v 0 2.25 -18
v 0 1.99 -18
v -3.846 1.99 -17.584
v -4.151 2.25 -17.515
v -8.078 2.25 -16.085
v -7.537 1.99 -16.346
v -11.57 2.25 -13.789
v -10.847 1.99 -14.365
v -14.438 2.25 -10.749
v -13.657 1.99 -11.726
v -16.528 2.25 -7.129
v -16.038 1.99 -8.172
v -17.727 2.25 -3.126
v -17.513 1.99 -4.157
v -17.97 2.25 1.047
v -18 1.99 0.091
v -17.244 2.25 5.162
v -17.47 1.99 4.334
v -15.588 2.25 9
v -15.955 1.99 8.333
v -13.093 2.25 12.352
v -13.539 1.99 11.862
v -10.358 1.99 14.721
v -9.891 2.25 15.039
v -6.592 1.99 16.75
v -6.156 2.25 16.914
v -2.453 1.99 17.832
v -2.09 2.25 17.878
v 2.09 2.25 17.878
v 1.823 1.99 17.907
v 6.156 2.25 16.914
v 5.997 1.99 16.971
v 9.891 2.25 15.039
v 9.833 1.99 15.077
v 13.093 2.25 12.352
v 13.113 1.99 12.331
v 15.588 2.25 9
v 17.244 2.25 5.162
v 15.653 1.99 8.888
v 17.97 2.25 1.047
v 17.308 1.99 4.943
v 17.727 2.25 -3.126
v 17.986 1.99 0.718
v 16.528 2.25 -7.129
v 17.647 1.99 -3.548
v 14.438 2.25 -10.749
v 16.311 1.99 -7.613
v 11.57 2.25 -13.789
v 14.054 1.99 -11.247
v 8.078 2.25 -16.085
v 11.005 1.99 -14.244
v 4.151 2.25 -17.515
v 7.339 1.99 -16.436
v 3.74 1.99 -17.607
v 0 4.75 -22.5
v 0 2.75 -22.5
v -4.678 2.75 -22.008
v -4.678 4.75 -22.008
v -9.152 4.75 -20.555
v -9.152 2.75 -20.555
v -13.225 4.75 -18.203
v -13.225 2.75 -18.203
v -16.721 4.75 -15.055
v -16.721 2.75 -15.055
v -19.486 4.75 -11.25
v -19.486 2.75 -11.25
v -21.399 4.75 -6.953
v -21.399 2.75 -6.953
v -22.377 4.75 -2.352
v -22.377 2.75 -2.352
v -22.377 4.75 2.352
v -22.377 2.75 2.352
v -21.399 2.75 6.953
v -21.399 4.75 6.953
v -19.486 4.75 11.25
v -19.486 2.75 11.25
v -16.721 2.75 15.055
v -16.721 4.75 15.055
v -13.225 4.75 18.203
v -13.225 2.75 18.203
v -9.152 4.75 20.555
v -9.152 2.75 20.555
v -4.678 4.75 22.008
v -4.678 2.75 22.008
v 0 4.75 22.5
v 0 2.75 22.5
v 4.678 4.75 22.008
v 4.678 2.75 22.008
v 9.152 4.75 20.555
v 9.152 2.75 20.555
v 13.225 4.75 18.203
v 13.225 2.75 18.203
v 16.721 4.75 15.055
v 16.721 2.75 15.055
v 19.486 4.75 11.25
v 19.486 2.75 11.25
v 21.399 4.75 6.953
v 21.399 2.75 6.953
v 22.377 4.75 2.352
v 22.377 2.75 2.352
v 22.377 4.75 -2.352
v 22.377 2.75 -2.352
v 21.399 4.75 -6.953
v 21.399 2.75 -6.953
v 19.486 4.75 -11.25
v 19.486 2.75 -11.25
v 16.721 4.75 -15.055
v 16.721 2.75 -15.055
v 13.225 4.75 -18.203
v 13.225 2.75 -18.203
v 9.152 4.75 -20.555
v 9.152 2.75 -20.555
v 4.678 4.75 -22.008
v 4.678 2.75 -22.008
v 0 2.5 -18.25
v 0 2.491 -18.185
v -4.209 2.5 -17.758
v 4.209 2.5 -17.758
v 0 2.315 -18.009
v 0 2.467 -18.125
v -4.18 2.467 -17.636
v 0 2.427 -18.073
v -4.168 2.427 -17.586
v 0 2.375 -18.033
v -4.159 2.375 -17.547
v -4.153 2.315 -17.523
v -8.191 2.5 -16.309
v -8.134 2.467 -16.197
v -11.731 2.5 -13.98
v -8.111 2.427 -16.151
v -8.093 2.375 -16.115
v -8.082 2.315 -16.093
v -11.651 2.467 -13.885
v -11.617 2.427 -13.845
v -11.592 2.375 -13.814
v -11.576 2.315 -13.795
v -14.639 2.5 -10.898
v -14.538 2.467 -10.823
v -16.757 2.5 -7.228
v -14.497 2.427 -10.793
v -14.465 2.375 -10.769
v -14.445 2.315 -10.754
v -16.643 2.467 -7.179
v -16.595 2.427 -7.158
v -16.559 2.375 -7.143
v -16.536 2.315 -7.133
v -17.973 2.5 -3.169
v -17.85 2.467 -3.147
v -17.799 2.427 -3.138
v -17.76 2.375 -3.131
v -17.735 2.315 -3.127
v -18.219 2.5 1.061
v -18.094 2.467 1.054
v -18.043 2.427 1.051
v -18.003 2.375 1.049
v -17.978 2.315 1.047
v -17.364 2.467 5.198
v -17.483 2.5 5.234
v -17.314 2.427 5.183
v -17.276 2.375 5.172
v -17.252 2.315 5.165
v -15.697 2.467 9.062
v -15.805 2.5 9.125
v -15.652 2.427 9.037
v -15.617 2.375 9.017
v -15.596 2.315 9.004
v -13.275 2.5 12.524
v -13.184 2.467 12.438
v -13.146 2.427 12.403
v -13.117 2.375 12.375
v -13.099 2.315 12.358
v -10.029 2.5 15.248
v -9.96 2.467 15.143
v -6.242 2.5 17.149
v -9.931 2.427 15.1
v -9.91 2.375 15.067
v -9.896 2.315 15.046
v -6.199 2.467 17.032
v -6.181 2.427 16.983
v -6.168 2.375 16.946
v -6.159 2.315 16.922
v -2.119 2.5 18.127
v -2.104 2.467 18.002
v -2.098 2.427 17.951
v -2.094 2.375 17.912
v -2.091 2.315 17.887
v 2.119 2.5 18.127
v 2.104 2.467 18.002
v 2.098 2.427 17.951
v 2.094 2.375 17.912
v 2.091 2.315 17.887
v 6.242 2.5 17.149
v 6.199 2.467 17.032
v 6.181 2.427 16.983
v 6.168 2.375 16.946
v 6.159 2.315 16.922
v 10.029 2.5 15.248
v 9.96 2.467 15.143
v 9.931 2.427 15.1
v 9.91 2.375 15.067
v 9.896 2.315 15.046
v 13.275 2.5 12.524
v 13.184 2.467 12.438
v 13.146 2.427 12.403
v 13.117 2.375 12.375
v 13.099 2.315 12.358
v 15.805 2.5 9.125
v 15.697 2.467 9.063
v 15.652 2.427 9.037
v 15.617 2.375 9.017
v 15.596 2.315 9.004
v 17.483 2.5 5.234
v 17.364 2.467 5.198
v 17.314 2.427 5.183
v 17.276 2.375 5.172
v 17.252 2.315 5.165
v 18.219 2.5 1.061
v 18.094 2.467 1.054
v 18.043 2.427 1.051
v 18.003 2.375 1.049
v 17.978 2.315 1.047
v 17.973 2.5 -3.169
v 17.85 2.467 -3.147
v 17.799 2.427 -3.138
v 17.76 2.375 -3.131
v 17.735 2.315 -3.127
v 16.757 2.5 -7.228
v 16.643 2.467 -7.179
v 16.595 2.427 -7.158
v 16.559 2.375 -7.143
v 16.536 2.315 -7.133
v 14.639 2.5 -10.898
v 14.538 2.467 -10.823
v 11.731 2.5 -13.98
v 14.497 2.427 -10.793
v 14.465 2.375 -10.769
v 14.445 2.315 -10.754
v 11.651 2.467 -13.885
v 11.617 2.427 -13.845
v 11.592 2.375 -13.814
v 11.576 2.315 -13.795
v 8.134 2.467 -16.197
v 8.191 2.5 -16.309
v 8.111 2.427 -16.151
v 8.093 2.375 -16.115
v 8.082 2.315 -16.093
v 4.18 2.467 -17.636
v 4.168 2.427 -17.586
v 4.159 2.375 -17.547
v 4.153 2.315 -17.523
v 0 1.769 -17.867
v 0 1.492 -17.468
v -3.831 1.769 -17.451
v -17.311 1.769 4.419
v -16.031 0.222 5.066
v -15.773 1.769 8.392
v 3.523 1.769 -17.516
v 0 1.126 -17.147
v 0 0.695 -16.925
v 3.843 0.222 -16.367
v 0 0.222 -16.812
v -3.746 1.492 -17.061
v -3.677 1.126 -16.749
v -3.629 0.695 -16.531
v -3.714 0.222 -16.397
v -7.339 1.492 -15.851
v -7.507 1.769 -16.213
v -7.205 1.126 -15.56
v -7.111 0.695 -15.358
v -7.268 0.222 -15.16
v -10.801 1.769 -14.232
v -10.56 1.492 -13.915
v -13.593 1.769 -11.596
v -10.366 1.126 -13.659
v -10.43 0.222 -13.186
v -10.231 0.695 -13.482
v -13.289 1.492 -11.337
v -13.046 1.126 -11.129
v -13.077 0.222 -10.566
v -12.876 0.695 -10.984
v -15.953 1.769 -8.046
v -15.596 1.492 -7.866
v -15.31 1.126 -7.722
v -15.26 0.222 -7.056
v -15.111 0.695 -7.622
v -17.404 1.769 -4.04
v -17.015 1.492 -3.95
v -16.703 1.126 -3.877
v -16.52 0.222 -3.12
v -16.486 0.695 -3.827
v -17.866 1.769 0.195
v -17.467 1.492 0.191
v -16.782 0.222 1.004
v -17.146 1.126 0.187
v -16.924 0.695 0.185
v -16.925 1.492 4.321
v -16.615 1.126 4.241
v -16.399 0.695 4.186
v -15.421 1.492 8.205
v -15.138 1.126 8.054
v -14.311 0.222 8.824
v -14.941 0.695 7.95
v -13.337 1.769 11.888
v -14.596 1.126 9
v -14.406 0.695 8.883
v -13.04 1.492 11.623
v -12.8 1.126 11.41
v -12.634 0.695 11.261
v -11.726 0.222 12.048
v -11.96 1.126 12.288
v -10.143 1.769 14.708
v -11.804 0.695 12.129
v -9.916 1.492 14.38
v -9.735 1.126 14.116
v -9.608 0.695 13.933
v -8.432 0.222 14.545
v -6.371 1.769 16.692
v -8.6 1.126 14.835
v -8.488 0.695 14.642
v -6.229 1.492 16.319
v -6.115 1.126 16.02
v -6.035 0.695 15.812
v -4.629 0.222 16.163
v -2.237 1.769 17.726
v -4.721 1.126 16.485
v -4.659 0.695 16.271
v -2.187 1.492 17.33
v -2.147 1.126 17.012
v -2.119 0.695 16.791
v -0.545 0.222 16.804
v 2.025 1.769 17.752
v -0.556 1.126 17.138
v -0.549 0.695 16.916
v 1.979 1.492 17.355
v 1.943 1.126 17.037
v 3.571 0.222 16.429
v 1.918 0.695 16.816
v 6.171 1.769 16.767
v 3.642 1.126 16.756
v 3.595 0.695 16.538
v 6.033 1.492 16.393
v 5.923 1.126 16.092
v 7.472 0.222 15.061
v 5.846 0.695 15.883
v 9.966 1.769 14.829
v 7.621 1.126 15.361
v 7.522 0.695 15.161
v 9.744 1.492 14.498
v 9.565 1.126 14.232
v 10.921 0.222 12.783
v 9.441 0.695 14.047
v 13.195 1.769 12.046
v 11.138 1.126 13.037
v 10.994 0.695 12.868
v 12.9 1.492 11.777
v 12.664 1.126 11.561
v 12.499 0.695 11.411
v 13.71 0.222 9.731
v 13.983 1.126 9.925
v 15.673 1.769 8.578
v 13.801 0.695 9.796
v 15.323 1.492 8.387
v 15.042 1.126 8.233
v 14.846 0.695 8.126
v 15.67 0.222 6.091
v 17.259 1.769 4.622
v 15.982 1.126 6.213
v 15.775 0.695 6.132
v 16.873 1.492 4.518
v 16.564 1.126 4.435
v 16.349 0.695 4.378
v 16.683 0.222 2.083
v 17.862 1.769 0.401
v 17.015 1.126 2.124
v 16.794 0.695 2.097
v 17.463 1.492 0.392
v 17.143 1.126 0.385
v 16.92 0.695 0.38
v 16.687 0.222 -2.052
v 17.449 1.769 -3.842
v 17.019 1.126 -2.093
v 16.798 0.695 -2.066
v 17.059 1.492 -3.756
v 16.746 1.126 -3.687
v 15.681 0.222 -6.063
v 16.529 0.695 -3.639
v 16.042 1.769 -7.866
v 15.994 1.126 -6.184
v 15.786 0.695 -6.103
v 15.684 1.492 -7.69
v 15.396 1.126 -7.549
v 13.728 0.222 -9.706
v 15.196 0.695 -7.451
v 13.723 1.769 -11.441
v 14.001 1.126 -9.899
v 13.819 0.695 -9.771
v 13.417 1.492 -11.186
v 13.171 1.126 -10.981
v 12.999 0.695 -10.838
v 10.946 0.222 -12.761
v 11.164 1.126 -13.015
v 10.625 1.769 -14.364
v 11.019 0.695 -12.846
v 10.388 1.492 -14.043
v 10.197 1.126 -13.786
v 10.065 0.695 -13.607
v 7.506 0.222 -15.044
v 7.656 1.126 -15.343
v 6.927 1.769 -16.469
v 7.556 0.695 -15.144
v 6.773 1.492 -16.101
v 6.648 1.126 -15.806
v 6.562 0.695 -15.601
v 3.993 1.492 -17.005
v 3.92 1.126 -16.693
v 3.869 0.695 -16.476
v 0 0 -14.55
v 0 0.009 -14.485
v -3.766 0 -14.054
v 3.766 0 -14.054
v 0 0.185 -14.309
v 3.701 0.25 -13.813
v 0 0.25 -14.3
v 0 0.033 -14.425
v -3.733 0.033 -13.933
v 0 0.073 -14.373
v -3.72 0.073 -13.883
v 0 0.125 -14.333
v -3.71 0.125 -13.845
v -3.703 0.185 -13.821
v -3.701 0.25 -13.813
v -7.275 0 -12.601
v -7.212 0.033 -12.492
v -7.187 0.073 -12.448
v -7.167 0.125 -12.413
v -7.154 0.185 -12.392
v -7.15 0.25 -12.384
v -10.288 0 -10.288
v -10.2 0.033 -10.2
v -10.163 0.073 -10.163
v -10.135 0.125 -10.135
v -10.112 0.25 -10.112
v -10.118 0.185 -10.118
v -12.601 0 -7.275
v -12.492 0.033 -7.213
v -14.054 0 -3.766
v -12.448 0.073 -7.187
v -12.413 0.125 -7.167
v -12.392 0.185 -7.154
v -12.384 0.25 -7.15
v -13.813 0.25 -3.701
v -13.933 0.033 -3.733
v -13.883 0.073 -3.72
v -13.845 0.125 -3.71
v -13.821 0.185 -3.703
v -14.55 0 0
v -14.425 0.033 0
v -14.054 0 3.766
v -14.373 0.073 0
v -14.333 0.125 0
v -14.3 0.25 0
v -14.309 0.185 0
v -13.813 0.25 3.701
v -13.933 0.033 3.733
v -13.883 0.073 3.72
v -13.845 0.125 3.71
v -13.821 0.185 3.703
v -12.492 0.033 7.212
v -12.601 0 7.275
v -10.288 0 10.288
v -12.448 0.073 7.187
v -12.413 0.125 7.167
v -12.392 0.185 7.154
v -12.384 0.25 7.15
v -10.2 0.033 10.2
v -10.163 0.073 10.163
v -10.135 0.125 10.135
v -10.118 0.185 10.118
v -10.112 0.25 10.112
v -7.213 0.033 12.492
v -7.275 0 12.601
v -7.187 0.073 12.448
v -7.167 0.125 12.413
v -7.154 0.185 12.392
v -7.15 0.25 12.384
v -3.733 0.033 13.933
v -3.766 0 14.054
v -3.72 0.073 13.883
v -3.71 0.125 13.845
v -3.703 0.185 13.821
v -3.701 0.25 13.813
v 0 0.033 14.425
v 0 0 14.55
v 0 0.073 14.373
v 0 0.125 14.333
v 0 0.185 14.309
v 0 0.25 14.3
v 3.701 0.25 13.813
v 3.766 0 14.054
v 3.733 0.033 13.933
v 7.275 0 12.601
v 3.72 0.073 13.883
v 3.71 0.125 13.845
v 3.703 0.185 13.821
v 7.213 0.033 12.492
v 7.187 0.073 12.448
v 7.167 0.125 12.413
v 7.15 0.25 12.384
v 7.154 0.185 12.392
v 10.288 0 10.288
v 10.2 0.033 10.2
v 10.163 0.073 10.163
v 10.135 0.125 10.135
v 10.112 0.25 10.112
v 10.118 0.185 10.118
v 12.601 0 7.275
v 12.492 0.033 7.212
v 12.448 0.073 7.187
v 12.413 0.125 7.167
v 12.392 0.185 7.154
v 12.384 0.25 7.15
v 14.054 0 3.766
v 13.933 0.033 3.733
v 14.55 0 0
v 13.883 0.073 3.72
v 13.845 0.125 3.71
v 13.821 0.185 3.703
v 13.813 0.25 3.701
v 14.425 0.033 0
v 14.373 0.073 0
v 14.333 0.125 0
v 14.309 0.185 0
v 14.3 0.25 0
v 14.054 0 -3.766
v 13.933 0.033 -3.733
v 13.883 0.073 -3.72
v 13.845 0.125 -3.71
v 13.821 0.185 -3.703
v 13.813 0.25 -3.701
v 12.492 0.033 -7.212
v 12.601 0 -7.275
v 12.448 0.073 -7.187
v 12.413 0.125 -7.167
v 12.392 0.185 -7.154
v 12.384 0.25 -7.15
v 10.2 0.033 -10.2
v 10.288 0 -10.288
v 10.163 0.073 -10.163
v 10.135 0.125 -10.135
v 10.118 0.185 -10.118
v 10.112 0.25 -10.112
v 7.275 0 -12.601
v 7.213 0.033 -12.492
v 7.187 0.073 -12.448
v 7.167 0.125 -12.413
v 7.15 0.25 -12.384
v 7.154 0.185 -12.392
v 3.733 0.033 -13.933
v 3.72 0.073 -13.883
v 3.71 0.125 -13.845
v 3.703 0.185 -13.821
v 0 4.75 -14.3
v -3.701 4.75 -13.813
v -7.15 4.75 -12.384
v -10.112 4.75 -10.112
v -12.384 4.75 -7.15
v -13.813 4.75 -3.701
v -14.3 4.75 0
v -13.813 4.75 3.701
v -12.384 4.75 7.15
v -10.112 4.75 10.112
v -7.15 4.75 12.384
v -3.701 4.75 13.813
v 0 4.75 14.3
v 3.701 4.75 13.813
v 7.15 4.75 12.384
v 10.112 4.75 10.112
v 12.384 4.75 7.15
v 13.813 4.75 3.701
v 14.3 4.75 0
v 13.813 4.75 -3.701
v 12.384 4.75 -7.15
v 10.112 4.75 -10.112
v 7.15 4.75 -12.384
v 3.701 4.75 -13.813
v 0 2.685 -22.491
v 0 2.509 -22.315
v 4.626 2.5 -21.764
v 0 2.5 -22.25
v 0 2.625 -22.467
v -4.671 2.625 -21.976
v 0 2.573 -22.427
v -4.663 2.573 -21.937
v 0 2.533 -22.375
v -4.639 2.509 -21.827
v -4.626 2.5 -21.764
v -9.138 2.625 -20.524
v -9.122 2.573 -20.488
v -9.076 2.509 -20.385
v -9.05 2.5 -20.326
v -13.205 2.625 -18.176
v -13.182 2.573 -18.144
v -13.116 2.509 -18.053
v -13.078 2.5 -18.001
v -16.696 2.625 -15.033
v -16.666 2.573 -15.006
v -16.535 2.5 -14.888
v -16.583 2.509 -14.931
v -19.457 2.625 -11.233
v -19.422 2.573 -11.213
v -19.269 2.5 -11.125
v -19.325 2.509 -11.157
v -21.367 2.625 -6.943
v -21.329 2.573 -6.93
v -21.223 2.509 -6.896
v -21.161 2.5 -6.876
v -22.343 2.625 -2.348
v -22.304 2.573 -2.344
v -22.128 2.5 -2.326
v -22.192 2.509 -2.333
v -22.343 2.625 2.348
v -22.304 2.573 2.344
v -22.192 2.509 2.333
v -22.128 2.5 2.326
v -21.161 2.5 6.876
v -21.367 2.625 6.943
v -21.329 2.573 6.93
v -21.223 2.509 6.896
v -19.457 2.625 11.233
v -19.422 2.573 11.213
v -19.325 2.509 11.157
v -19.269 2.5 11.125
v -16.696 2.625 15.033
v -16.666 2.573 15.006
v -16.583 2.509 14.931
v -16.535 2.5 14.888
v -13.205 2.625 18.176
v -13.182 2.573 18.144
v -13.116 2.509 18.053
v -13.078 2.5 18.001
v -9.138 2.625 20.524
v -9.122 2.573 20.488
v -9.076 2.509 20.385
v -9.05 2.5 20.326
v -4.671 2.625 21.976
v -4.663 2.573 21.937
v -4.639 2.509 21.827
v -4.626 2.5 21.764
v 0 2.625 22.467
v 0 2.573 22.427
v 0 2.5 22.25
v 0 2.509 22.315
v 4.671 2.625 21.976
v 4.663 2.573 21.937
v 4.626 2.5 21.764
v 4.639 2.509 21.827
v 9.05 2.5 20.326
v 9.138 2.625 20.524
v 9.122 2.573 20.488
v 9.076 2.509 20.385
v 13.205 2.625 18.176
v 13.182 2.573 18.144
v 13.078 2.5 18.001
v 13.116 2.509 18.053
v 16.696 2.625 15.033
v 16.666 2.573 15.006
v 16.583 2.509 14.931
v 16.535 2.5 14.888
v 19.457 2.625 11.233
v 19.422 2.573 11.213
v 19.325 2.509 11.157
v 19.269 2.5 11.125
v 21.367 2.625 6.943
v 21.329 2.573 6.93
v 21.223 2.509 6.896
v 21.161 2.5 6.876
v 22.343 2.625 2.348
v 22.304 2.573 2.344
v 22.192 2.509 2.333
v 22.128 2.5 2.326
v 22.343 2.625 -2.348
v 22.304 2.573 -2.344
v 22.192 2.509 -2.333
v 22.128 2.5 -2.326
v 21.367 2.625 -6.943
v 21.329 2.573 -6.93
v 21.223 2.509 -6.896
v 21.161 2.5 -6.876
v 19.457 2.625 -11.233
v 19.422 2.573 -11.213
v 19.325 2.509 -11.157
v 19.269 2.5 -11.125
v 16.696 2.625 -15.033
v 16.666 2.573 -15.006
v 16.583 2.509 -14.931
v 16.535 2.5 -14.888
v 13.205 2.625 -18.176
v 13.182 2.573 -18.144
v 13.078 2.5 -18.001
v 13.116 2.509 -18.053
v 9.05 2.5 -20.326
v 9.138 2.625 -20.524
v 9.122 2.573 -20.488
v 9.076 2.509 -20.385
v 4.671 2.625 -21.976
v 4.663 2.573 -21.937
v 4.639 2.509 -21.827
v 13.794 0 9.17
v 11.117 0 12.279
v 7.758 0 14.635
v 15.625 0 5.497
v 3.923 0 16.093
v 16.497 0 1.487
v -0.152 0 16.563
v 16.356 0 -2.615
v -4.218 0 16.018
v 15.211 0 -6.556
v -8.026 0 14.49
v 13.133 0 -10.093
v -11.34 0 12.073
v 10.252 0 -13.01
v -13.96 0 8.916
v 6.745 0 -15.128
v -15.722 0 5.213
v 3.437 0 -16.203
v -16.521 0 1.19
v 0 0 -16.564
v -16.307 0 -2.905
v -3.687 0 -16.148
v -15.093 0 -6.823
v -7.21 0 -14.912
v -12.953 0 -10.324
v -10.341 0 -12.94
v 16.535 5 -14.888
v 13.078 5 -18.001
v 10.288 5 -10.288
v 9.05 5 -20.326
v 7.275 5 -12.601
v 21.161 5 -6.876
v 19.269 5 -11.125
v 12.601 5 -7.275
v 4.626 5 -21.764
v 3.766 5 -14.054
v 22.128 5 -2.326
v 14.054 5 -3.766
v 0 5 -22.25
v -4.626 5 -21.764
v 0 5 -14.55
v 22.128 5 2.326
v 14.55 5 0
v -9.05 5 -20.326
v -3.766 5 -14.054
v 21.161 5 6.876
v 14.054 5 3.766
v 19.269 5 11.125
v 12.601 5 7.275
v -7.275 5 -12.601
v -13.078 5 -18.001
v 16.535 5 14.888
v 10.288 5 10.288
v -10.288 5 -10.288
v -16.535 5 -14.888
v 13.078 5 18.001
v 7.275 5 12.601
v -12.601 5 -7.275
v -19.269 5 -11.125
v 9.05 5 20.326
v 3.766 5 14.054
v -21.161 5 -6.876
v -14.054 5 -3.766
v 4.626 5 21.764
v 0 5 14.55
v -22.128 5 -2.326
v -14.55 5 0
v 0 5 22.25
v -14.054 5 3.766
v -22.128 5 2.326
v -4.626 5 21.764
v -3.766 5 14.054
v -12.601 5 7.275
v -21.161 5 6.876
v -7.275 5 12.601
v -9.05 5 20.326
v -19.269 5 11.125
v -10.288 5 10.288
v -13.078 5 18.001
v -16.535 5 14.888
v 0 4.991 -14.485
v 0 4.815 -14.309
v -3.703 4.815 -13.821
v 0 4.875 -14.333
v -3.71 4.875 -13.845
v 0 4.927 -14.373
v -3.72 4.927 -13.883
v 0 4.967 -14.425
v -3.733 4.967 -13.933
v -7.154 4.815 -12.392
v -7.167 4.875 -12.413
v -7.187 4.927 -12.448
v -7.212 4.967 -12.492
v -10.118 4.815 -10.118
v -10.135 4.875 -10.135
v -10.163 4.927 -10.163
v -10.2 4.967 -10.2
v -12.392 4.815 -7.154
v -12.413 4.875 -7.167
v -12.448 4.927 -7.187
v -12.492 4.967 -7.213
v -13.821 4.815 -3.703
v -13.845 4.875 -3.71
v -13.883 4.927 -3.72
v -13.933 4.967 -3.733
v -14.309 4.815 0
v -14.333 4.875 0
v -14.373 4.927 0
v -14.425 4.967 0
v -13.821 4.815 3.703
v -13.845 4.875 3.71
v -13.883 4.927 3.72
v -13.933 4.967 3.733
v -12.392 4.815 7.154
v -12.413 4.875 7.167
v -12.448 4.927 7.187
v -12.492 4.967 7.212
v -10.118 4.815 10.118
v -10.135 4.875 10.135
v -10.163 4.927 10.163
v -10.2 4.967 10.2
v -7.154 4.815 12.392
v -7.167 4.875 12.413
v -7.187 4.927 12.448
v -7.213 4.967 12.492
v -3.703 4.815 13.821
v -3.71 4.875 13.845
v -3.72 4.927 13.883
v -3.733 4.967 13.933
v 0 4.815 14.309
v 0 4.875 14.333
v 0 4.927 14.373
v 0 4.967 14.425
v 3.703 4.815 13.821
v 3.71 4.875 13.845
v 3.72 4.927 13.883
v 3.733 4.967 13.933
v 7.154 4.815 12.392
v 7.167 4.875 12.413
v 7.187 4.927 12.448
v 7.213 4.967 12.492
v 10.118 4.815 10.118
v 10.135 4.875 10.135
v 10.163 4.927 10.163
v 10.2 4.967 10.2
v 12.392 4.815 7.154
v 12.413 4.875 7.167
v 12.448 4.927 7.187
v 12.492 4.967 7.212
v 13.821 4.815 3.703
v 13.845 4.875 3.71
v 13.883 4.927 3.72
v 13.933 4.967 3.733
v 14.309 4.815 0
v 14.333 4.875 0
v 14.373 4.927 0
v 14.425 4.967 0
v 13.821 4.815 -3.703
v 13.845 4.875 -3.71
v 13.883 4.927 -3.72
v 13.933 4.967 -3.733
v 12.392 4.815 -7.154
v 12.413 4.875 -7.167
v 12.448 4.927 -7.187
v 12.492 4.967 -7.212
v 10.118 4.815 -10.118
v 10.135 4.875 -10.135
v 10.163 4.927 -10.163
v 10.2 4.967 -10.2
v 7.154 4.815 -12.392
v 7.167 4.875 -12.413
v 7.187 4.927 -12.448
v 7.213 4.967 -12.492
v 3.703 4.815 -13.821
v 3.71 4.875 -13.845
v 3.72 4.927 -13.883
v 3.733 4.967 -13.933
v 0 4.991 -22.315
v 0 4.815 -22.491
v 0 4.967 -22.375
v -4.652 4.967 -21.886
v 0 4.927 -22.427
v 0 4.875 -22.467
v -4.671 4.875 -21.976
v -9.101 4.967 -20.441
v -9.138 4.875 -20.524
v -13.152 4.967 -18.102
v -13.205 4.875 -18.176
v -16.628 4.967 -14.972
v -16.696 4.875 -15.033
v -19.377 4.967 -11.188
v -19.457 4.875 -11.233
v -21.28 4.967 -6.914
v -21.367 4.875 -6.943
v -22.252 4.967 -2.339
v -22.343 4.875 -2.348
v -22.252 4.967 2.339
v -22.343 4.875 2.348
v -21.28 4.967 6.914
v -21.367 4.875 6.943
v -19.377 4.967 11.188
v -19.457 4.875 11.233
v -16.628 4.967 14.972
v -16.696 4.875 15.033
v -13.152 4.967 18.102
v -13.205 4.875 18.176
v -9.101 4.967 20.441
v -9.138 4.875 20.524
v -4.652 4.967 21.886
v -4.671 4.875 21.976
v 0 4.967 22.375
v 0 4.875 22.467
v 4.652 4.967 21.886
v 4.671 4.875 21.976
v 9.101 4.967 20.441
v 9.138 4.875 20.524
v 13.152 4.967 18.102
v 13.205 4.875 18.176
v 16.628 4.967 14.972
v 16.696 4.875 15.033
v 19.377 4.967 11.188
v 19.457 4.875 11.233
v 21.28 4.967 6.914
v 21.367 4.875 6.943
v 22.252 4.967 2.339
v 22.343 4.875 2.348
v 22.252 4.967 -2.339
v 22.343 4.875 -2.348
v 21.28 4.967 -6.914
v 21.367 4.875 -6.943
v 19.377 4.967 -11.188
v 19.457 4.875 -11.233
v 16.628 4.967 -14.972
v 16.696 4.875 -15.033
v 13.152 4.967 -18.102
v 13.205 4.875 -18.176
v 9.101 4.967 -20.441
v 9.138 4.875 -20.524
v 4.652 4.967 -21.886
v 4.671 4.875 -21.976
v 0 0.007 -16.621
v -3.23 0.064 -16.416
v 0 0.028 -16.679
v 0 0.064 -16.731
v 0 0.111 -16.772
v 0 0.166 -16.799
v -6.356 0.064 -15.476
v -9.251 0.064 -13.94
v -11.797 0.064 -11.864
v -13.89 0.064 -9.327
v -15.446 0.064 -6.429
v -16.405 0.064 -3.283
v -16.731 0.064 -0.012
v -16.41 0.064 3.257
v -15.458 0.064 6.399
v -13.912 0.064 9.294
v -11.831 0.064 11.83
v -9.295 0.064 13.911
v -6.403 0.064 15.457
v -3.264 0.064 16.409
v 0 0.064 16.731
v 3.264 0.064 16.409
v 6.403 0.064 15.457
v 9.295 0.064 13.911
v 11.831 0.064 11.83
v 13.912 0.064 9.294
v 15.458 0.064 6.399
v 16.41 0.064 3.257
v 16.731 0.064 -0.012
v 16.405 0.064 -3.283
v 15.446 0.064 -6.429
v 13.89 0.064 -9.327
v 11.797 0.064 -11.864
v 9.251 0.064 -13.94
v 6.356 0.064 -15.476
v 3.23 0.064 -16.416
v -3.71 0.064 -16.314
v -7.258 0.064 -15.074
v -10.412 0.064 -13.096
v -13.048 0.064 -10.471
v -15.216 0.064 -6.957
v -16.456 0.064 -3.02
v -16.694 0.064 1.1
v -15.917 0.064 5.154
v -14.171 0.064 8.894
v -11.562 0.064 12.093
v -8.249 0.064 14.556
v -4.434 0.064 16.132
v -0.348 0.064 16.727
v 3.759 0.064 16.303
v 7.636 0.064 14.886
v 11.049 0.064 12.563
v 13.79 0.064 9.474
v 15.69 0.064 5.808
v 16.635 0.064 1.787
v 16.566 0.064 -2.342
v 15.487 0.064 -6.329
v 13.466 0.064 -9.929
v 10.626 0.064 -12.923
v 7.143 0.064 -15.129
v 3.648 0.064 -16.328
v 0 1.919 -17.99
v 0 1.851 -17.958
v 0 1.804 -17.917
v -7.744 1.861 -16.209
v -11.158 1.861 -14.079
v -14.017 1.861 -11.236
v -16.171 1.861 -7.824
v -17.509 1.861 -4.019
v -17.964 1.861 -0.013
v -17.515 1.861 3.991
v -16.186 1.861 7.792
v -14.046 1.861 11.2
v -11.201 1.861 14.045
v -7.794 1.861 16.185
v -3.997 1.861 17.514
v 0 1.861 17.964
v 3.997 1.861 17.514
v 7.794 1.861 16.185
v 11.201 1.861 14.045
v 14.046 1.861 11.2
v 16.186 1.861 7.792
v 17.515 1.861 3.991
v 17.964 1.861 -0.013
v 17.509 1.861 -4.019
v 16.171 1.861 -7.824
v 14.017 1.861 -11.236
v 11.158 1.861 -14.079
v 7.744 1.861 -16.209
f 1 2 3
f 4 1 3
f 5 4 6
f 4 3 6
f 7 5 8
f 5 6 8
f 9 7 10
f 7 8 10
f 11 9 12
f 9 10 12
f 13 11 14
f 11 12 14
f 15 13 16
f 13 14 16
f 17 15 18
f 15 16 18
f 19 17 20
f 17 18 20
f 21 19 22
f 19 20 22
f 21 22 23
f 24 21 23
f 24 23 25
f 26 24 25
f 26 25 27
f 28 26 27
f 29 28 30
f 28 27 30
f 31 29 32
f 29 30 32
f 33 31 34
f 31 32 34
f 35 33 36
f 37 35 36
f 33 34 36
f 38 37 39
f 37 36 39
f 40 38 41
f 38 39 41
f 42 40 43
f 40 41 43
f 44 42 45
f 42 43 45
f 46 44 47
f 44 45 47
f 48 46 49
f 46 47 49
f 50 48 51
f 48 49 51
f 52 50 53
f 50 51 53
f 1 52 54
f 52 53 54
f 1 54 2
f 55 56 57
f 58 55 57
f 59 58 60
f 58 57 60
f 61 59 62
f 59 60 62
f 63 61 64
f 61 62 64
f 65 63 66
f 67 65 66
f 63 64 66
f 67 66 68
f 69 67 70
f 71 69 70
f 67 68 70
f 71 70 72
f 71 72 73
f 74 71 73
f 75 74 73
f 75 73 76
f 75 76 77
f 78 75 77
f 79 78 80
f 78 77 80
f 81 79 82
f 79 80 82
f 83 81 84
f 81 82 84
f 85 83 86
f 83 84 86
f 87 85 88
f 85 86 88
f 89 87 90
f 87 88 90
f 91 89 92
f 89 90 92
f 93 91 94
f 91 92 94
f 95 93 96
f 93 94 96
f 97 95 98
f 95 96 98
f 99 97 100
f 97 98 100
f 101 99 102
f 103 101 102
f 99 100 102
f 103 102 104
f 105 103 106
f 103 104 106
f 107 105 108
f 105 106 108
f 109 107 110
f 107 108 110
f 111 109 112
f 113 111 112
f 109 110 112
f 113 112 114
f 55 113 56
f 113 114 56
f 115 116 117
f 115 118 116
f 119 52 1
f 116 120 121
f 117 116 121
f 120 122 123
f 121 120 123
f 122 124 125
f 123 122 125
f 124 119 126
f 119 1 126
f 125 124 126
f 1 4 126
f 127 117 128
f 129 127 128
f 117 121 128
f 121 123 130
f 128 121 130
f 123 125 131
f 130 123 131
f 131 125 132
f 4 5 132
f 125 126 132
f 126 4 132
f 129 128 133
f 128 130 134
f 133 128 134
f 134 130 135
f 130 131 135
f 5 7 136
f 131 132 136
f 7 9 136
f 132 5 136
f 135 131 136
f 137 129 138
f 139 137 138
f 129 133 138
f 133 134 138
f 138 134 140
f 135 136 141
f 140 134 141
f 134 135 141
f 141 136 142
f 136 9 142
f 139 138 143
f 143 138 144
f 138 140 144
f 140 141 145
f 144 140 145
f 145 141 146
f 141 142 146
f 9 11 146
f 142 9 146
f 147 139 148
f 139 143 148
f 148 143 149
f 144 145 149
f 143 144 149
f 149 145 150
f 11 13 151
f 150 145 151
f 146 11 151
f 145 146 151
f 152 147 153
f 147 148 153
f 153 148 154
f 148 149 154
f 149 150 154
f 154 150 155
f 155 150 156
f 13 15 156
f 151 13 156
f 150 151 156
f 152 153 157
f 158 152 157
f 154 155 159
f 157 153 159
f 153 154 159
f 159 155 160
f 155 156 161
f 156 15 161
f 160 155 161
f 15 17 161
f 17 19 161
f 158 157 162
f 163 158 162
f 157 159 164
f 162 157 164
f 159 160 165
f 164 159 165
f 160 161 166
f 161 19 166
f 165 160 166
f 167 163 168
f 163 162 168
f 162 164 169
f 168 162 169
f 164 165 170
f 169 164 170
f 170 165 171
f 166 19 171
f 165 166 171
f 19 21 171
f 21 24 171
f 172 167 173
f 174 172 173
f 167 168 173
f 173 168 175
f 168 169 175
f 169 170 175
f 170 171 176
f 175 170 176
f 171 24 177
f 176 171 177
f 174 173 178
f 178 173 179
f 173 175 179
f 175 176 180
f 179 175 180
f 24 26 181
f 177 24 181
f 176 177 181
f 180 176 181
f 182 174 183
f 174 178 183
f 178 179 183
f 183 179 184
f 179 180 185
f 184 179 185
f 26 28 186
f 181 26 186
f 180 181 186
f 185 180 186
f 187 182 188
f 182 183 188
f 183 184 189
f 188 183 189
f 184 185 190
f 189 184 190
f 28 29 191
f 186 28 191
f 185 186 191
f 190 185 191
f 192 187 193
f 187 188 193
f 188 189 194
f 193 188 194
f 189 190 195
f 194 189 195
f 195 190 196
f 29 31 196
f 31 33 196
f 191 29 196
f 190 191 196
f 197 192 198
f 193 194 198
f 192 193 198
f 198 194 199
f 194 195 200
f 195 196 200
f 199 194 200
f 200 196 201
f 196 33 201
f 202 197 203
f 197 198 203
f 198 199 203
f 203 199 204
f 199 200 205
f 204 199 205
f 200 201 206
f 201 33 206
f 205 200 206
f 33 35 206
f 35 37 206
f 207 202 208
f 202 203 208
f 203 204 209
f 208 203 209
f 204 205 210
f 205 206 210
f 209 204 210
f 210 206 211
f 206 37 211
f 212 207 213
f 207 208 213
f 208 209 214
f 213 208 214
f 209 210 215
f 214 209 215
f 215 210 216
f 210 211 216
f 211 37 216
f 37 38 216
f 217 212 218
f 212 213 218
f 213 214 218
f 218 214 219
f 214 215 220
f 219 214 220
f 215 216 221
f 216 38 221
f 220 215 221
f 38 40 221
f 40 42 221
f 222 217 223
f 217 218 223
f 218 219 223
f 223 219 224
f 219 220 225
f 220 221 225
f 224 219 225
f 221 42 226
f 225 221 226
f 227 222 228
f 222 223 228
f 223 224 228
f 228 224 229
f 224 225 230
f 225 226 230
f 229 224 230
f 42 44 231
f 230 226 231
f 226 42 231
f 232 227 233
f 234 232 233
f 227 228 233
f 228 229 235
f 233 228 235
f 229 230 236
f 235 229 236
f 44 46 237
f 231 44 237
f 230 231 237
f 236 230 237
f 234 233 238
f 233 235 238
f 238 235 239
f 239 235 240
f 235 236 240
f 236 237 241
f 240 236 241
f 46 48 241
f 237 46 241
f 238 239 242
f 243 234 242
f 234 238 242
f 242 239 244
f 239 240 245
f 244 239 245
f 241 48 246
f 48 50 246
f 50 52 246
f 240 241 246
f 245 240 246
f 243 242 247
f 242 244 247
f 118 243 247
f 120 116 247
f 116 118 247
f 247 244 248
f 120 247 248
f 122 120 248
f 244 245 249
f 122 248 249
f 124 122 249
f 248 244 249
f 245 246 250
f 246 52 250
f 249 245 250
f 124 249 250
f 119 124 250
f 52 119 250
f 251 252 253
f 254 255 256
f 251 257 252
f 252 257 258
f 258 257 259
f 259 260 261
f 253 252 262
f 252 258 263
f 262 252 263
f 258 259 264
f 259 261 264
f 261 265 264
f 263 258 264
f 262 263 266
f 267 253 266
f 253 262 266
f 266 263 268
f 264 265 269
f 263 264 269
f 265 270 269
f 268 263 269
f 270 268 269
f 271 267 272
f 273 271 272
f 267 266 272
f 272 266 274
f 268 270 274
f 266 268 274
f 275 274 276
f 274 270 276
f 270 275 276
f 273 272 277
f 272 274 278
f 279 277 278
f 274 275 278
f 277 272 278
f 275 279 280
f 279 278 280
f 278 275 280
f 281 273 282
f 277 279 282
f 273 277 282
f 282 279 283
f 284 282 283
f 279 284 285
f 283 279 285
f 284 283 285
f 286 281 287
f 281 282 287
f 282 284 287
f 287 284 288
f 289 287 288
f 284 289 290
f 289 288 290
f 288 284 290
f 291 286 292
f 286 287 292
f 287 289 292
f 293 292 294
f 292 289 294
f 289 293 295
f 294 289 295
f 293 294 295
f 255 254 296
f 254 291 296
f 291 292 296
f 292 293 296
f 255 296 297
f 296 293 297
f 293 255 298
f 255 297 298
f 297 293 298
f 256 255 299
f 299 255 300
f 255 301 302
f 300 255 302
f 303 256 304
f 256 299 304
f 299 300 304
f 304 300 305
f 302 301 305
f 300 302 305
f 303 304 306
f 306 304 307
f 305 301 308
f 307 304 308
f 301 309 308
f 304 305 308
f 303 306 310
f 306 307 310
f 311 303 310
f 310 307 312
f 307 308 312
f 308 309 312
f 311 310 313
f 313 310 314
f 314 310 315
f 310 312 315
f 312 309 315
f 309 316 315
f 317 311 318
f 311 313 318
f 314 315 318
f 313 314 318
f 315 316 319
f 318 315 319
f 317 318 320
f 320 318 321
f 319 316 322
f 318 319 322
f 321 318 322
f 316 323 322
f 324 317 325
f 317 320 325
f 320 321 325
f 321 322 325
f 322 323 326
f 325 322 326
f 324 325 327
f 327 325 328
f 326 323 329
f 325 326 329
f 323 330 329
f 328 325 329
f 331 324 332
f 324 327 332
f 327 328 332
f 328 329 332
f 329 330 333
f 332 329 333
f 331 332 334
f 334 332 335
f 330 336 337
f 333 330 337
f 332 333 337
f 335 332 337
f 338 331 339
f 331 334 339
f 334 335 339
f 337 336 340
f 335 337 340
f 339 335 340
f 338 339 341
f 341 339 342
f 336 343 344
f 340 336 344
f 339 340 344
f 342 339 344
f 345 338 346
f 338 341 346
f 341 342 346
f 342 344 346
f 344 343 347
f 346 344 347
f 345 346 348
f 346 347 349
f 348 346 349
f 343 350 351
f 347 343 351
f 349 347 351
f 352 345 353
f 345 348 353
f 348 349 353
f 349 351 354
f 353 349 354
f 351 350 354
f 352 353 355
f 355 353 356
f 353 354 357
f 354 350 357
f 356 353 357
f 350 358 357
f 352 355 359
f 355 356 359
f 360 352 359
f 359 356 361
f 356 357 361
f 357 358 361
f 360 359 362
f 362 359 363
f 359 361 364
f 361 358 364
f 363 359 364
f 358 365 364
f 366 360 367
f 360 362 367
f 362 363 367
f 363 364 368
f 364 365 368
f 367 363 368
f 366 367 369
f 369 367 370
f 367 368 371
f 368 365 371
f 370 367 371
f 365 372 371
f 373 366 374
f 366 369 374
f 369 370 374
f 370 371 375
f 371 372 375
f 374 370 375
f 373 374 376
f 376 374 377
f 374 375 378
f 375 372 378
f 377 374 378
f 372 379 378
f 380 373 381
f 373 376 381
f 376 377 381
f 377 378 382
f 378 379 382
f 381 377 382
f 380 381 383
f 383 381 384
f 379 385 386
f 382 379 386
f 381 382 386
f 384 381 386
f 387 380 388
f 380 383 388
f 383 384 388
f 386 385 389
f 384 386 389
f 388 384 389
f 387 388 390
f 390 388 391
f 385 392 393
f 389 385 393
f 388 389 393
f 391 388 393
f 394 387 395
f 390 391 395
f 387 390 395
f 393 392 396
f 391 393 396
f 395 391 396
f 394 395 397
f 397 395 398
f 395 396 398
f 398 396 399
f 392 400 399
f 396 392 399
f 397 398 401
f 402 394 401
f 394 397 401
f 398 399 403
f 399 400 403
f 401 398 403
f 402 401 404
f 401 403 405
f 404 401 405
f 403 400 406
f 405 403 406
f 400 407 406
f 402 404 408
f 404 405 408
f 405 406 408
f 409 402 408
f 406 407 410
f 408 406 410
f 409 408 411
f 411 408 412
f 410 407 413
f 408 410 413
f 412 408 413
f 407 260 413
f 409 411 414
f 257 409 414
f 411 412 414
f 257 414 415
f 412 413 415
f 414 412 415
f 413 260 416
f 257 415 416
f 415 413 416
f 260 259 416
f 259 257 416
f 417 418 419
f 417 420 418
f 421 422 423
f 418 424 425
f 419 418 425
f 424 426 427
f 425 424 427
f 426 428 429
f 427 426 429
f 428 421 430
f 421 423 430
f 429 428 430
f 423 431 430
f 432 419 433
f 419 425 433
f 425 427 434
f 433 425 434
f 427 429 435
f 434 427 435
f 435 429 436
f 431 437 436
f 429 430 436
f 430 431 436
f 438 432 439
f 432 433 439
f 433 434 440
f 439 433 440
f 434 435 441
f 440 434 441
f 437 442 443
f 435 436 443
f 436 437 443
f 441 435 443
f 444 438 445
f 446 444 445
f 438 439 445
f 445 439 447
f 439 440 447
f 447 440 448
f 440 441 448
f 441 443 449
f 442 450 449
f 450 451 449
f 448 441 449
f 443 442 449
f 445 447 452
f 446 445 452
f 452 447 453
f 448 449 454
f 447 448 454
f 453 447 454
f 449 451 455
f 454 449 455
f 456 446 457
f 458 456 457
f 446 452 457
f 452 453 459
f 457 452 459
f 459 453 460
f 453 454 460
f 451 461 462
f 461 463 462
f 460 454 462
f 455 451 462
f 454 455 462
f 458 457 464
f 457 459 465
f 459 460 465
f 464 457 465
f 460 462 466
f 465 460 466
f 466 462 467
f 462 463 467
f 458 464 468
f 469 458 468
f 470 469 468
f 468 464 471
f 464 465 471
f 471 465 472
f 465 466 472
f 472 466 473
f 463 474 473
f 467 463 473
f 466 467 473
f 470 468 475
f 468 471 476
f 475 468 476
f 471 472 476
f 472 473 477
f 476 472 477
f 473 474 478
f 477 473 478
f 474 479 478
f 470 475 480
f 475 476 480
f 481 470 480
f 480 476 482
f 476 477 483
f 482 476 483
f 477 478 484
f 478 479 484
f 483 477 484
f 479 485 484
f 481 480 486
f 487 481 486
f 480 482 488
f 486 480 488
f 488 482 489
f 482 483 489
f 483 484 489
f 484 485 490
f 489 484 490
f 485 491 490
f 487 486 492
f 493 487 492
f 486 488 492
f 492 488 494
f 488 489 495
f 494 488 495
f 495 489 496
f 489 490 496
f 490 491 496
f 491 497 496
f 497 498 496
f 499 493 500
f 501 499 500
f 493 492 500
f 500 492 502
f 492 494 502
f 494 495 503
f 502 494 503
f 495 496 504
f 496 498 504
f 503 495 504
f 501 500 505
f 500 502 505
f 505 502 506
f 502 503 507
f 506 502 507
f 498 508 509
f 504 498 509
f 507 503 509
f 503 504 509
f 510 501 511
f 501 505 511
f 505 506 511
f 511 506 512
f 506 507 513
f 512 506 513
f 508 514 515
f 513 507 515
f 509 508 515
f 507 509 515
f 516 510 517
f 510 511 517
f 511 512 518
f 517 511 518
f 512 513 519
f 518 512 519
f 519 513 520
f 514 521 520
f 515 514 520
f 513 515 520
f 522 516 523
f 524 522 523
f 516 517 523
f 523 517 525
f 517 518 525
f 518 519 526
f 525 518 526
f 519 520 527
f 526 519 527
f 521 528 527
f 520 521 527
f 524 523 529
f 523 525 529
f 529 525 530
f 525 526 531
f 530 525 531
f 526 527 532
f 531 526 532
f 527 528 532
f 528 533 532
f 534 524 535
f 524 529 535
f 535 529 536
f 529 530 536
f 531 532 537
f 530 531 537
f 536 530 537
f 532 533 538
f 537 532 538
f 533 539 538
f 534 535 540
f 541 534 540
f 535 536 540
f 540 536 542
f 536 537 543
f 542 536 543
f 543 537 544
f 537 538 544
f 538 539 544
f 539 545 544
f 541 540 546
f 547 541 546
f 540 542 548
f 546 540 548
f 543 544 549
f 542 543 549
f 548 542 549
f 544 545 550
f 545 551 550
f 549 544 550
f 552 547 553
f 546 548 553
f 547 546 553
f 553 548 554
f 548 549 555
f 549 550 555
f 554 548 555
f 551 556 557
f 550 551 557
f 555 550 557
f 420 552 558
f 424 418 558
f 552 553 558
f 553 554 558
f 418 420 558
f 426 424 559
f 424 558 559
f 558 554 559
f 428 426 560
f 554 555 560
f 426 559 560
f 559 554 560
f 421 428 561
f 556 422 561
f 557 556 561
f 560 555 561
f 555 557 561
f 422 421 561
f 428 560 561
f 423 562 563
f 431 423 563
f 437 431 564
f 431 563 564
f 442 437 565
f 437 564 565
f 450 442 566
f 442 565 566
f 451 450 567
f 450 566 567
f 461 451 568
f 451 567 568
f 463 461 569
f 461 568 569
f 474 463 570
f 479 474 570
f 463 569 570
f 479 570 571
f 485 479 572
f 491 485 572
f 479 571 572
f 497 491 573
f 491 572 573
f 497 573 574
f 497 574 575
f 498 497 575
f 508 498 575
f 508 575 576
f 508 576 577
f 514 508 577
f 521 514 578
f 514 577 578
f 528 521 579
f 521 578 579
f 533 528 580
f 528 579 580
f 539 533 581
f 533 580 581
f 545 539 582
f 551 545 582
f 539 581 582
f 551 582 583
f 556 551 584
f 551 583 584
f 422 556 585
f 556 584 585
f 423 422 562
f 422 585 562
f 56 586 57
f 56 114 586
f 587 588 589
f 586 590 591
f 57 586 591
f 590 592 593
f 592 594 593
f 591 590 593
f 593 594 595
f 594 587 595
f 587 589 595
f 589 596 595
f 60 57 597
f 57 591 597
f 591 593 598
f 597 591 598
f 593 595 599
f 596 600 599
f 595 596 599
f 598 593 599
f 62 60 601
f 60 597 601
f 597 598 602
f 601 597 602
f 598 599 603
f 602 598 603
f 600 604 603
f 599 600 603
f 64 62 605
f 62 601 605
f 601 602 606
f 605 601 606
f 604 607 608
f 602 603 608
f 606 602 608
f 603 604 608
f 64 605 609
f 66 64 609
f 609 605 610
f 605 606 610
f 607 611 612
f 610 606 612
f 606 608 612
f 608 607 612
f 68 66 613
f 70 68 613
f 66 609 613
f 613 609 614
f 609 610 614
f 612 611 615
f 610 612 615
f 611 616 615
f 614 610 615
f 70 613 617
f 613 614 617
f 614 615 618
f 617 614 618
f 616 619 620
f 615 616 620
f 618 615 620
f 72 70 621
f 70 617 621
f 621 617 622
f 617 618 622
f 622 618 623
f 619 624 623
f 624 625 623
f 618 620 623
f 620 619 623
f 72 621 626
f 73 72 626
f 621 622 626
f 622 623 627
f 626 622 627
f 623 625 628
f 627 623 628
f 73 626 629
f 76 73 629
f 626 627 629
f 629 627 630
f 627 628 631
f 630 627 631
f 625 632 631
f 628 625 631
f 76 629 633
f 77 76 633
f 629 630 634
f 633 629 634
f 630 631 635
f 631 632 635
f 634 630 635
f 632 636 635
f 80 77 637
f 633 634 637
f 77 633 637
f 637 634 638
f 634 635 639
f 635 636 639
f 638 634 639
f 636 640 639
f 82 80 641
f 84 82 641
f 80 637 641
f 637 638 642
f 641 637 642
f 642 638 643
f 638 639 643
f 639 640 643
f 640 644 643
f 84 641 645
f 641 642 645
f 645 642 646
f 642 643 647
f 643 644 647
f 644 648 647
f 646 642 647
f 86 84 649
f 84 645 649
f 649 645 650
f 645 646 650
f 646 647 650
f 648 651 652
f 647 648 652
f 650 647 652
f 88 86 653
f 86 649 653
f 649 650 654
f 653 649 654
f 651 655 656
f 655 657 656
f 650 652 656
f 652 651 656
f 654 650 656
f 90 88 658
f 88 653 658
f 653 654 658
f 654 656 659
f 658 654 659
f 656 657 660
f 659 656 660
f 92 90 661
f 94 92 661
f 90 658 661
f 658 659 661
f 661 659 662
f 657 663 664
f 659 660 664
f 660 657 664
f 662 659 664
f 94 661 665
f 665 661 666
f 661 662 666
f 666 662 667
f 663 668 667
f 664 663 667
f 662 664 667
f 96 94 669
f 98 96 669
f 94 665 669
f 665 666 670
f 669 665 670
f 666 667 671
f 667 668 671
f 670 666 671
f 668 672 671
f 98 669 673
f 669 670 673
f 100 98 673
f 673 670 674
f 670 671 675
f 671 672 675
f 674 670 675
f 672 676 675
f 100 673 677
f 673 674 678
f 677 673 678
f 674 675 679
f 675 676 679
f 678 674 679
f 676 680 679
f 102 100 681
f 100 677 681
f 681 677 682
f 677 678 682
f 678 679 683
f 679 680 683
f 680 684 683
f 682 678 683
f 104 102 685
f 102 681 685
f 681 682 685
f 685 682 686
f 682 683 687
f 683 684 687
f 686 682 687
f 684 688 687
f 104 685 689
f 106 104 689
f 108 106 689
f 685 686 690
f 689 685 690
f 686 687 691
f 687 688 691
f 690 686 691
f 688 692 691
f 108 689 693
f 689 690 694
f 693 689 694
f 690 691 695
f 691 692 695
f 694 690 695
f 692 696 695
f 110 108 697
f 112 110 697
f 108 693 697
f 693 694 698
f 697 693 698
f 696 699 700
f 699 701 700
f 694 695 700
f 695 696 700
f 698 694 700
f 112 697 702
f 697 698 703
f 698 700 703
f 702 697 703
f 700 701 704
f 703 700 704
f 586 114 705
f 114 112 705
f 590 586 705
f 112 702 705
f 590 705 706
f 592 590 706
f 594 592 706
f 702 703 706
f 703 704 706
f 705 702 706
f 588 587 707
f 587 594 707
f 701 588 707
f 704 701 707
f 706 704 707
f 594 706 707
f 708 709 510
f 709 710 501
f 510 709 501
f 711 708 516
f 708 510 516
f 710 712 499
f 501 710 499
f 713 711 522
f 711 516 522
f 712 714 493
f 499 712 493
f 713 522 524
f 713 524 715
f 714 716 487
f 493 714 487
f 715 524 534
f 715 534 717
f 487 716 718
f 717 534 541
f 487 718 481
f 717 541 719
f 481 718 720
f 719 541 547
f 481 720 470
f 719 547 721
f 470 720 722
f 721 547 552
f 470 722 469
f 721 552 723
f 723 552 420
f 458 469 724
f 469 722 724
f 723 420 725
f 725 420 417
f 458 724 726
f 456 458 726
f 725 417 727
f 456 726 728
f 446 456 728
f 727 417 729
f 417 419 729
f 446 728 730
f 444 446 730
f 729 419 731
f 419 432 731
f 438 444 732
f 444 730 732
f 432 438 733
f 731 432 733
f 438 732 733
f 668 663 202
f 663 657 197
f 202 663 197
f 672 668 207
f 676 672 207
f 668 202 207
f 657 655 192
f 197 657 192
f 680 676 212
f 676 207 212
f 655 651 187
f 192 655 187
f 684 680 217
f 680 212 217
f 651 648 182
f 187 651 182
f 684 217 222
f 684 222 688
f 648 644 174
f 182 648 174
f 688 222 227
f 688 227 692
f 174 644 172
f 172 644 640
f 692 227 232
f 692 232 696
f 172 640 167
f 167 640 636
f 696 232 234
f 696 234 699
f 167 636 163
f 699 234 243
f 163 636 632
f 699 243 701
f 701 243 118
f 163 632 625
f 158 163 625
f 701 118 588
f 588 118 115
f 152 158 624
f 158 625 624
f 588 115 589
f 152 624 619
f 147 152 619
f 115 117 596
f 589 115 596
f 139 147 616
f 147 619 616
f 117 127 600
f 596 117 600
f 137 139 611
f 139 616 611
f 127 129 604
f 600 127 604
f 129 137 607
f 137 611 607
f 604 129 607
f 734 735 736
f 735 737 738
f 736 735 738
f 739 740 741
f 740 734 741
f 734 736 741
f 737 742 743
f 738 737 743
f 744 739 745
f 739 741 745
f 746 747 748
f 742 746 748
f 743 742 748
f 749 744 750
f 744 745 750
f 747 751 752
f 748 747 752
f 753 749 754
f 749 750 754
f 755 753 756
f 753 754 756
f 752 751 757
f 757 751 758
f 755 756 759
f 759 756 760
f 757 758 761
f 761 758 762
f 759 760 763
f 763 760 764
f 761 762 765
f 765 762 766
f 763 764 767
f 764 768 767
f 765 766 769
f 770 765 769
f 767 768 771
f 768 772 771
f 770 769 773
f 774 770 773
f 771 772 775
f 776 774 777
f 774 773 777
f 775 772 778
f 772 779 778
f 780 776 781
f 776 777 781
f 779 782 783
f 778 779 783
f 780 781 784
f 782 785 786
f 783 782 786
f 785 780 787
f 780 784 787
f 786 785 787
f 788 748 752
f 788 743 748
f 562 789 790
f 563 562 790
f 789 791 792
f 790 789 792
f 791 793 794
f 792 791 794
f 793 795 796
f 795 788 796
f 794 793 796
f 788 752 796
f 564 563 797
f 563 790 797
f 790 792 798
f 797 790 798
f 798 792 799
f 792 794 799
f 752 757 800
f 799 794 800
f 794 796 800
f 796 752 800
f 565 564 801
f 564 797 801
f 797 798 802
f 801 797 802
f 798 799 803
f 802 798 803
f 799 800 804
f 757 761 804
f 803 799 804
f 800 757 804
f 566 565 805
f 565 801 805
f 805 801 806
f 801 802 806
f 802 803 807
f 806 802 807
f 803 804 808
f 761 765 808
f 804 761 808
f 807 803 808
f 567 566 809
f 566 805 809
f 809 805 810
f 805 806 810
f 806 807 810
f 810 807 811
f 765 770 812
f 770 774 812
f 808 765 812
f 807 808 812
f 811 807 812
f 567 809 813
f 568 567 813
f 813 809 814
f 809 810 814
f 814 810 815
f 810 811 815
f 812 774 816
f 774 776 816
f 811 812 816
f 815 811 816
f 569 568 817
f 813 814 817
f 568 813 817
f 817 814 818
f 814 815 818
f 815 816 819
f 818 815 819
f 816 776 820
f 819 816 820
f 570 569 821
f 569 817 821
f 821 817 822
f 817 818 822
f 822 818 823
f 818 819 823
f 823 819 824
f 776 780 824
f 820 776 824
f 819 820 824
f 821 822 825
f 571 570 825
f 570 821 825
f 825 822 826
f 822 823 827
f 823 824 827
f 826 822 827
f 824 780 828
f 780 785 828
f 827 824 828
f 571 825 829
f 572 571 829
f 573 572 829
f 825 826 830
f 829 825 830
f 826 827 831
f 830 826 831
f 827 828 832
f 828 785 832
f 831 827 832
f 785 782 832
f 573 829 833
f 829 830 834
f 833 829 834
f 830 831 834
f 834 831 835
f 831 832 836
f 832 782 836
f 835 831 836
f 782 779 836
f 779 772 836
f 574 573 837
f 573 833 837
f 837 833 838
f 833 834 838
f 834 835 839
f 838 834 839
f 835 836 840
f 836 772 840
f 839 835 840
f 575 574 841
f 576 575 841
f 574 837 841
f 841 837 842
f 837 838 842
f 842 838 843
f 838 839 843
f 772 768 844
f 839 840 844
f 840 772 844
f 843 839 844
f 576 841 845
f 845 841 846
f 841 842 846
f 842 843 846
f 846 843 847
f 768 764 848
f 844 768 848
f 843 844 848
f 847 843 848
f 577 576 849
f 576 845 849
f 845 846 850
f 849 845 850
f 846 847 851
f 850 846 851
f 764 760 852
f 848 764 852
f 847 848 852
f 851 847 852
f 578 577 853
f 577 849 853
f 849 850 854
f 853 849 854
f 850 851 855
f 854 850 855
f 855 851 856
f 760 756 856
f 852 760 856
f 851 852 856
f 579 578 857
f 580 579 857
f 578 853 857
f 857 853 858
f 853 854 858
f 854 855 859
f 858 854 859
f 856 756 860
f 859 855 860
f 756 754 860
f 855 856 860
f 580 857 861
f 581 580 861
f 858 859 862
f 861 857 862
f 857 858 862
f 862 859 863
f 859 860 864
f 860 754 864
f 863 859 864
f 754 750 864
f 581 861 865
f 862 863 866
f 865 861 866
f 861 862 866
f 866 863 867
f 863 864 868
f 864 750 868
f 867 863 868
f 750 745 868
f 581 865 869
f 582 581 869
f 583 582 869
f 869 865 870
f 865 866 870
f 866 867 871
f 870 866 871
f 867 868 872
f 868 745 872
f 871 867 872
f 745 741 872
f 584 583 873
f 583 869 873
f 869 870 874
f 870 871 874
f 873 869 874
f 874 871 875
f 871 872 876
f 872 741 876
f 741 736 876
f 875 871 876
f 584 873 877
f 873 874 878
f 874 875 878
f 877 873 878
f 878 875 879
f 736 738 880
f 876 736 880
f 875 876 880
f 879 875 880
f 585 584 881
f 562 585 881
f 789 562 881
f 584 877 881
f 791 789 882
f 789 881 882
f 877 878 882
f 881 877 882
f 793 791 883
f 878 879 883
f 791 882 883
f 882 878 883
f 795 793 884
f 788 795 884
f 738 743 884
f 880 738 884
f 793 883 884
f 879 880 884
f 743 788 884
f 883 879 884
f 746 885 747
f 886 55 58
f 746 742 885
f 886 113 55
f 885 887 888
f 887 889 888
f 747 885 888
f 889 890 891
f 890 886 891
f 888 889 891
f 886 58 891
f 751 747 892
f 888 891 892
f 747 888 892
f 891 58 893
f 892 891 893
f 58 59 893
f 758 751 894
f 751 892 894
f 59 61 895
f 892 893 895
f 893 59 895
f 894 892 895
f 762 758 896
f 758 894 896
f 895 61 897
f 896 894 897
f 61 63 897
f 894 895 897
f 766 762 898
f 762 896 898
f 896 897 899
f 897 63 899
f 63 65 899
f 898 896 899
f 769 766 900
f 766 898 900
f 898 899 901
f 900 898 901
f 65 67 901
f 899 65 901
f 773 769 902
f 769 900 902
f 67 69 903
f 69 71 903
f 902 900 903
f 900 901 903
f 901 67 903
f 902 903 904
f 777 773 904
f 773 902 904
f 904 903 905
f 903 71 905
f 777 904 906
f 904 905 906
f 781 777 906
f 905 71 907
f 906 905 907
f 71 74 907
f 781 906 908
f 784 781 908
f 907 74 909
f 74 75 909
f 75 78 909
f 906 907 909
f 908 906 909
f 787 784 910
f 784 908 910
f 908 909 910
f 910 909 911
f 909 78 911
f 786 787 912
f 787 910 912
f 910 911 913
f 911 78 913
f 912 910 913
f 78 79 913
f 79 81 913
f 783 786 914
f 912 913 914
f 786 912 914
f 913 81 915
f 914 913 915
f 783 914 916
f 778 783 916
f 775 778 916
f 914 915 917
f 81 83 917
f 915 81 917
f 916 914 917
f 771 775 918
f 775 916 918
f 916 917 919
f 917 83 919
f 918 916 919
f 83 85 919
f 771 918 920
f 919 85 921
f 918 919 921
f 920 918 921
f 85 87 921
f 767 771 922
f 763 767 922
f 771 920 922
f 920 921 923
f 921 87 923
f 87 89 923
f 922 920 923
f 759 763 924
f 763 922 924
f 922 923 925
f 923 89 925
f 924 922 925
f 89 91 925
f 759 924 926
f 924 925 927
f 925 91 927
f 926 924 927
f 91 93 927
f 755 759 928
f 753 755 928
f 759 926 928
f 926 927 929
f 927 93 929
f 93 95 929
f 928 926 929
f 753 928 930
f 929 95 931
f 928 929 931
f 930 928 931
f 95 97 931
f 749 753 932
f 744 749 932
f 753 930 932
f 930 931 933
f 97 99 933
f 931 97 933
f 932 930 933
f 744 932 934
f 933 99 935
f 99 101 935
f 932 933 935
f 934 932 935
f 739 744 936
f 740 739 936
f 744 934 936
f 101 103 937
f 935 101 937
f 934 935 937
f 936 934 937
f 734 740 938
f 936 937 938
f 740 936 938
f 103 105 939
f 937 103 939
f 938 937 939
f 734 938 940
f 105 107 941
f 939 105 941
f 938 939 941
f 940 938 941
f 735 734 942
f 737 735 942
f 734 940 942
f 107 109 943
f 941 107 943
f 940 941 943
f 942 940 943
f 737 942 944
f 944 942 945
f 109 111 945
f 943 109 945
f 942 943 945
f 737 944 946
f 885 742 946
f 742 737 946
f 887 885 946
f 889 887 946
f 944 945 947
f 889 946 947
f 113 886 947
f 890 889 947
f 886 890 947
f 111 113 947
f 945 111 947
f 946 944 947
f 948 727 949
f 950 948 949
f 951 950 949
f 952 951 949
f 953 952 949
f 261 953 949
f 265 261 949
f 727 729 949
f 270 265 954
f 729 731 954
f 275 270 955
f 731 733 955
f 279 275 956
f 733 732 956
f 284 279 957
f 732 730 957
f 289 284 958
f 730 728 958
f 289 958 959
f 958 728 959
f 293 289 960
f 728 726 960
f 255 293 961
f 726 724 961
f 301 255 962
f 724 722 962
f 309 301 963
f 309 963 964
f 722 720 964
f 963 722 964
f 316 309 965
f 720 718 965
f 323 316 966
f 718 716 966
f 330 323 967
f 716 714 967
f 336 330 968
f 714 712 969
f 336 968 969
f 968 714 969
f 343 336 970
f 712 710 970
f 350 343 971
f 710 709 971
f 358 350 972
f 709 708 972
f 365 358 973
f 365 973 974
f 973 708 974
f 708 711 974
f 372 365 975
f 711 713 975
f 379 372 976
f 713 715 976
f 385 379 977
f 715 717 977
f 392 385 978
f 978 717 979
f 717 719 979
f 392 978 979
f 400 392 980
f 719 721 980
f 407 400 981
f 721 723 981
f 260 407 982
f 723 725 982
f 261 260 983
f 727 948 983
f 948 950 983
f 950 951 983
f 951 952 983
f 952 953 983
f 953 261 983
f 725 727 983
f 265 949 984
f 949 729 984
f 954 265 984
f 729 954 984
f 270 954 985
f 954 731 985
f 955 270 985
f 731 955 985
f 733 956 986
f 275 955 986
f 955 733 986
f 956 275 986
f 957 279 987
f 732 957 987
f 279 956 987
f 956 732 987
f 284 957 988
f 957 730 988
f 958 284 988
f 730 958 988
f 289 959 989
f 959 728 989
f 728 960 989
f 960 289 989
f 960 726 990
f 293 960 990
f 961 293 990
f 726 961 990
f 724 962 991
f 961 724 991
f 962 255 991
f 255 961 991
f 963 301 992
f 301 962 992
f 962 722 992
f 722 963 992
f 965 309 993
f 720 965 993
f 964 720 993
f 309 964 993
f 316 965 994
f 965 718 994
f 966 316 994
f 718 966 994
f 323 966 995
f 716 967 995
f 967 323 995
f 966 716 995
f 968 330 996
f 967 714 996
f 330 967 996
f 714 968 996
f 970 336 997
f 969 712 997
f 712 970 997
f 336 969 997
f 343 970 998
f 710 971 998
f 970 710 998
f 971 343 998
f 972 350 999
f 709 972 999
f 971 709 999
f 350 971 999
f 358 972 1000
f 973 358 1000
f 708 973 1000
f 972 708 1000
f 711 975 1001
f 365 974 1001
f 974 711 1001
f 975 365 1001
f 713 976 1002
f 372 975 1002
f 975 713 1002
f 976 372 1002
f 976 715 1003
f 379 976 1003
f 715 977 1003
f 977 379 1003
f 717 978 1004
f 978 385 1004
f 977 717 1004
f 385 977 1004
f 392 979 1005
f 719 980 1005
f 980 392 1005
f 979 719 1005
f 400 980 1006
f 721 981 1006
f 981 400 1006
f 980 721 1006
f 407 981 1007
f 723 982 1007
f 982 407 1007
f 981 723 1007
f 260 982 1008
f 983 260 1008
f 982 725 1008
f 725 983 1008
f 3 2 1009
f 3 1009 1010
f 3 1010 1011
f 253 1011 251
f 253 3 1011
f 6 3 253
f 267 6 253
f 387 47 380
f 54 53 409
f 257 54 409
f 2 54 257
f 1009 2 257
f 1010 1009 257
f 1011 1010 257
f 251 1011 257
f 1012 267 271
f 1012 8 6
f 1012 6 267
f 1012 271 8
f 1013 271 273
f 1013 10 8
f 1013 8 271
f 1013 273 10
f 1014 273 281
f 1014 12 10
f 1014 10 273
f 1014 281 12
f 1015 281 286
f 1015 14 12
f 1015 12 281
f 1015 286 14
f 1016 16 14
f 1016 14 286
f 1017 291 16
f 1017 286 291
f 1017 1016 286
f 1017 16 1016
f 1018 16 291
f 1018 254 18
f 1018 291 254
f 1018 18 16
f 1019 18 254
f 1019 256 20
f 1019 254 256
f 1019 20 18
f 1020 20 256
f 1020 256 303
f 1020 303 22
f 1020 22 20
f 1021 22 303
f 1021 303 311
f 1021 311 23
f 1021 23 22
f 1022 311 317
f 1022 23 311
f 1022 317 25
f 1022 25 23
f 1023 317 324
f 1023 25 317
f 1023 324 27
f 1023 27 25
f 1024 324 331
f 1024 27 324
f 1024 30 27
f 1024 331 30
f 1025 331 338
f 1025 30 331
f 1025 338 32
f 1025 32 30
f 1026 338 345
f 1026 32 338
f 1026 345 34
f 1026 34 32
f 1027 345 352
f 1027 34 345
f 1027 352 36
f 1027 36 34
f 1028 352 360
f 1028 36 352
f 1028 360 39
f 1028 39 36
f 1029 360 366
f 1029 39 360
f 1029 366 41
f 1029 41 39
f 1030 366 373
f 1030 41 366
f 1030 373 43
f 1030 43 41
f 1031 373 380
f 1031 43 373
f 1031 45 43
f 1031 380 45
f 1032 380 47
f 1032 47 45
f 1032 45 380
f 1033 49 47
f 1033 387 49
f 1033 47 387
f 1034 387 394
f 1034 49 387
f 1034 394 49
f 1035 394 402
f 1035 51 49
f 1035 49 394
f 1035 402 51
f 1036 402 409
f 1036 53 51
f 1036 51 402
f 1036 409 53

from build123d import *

# Parameters (mm, degrees)
FILLET1_R = 0.25


with BuildPart() as part:
    # Sketch1 → Revolve1 (revolve)
    with BuildSketch(Plane.XY, mode=Mode.PRIVATE) as revolve1_sk:
        with BuildLine():
            Line((16.8, 0), (14.3, 0))
            Line((14.3, 0), (14.3, 5))
            Line((14.3, 5), (22.5, 5))
            Line((22.5, 5), (22.5, 2.5))
            Line((22.5, 2.5), (18, 2.5))
            Line((18, 2.5), (18, 1.833030278))
            ThreePointArc((18, 1.833030278), (17.126679947, 1.095445115), (16.8, 0))
        make_face()
    revolve(revolve1_sk.sketch.rotate(Axis((0, 0, 0), (0, 1, 0)), 90), axis=Axis((0, 0, 0), (0, 1, 0)))

    # Fillet1
    fillet1_edges = [part.edges().sort_by_distance(p)[0] for p in [
        (0, 2.5, 18),
        (0, 1.833030278, 18),
        (0, 0, 16.8),
        (0, 0, 14.3),
        (0, 5, 14.3),
        (0, 5, 22.5),
        (0, 2.5, 22.5),
    ]]
    fillet(fillet1_edges, radius=FILLET1_R)


solid = part.part
